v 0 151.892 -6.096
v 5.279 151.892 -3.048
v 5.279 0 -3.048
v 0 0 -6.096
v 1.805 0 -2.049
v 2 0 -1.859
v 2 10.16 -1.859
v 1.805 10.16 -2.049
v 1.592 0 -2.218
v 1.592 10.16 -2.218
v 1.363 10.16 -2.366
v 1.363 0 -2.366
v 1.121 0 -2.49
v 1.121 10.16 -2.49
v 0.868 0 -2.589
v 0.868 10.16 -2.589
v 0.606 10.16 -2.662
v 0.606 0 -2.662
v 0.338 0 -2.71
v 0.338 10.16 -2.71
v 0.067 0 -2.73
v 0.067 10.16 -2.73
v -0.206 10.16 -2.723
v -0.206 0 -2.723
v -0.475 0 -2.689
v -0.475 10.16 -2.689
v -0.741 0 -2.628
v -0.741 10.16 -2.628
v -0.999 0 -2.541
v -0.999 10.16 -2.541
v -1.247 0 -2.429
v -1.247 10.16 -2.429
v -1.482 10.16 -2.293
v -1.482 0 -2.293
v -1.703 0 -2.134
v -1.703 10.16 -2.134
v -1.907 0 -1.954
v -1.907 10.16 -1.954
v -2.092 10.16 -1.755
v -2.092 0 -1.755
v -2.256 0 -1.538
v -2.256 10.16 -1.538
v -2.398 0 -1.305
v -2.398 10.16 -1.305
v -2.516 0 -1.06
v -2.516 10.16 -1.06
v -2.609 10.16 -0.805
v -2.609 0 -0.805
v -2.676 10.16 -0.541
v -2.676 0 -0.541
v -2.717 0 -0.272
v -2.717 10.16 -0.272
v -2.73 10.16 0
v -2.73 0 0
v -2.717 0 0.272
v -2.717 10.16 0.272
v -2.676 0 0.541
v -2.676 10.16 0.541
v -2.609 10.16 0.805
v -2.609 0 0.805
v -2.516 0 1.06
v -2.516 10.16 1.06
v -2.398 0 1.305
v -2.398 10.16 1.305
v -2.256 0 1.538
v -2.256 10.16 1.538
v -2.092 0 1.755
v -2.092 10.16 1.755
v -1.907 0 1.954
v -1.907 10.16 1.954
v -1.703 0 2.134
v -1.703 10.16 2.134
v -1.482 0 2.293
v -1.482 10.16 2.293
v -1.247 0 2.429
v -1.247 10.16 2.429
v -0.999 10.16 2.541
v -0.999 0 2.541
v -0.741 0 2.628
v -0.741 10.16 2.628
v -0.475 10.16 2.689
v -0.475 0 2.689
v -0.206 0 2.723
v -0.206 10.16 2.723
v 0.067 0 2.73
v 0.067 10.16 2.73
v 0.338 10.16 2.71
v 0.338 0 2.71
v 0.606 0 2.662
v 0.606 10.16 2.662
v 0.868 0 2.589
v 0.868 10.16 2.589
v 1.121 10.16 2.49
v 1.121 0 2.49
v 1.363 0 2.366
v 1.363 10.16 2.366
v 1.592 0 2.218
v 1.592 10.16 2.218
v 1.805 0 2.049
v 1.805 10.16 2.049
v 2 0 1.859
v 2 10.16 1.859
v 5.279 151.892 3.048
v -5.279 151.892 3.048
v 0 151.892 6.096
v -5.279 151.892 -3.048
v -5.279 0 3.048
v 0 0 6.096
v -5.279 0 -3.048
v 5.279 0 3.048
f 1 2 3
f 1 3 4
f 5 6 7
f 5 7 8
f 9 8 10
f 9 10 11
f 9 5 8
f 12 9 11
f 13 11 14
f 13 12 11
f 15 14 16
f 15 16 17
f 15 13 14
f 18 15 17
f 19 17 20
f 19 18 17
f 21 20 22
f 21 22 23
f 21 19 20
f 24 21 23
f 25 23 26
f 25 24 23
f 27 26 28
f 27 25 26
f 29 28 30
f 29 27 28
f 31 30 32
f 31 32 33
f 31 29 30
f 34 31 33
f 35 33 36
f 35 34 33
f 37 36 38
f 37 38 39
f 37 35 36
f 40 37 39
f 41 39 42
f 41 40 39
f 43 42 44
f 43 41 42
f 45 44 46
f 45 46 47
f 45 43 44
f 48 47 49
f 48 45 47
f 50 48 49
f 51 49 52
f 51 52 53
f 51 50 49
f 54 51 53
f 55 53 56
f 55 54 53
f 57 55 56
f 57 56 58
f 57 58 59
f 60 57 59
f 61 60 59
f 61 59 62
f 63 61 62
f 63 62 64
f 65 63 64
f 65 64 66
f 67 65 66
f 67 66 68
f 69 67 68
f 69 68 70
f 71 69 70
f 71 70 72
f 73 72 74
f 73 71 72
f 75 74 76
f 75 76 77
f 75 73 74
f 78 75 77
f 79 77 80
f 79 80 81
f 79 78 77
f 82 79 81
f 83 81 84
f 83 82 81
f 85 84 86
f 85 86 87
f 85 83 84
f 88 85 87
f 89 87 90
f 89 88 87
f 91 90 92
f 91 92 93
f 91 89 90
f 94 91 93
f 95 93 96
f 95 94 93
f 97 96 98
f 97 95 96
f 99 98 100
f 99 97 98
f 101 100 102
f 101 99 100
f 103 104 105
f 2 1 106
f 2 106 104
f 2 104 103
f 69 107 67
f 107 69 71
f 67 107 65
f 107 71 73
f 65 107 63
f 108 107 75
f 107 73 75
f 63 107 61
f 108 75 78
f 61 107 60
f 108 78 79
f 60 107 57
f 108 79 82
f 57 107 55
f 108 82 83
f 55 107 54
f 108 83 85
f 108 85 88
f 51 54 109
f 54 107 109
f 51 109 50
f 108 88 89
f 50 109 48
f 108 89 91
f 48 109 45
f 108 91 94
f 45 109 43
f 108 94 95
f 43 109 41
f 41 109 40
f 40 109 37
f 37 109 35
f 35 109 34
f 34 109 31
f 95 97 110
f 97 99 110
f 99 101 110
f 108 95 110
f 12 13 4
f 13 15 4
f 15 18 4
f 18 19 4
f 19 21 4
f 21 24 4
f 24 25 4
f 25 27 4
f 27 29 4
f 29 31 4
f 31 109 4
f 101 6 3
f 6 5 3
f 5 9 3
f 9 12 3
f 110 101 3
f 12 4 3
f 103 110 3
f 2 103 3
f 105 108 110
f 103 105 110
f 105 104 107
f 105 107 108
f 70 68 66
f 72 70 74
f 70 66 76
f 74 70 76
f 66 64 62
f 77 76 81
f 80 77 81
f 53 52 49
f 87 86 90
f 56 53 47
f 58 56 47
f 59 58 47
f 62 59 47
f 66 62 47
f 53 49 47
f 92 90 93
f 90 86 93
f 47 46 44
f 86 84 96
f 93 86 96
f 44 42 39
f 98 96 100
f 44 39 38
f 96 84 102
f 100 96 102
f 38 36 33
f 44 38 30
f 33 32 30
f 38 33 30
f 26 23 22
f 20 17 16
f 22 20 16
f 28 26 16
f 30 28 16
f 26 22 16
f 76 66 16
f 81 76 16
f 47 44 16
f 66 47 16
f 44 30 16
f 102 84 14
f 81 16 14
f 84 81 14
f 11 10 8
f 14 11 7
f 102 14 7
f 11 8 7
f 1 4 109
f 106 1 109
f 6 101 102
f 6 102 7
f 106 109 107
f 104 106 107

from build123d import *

# Parameters (mm, degrees)
BOSS_EXTRUDE1_DEPTH = 151.892
CUT_EXTRUDE1_DEPTH  = 10.16


with BuildPart() as part:
    # Sketch1 → Boss-Extrude1 (new body)
    # profile 1 of 2: a face of its own
    with BuildSketch(Plane(origin=(0, 0, 0), x_dir=(1, 0, 0), z_dir=(0, 1, 0))):
        Polygon((0, 6.096), (-5.279290861, 3.048), (-5.279290861, -3.048), (0, -6.096), (5.279290861, -3.048), (5.279290861, 3.048), align=None)
        with BuildLine():
            ThreePointArc((2, 1.858932557), (-2.7305, 0), (2, -1.858932557))
            Line((2, -1.858932557), (2, 1.858932557))
        make_face(mode=Mode.SUBTRACT)
    # profile 2 of 2: a face of its own
    with BuildSketch(Plane(origin=(0, 0, 0), x_dir=(1, 0, 0), z_dir=(0, 1, 0))):
        with BuildLine():
            Line((2, -1.858932557), (2, 1.858932557))
            ThreePointArc((2, 1.858932557), (-2.7305, 0), (2, -1.858932557))
        make_face()
    extrude(amount=BOSS_EXTRUDE1_DEPTH)

    # Sketch1<3> → Cut-Extrude1 (cut)
    with BuildSketch(Plane(origin=(0, 0, 0), x_dir=(1, 0, 0), z_dir=(0, 1, 0))):
        with BuildLine():
            Line((2, -1.858932557), (2, 1.858932557))
            ThreePointArc((2, 1.858932557), (-2.7305, 0), (2, -1.858932557))
        make_face()
    extrude(amount=CUT_EXTRUDE1_DEPTH, mode=Mode.SUBTRACT)


solid = part.part
